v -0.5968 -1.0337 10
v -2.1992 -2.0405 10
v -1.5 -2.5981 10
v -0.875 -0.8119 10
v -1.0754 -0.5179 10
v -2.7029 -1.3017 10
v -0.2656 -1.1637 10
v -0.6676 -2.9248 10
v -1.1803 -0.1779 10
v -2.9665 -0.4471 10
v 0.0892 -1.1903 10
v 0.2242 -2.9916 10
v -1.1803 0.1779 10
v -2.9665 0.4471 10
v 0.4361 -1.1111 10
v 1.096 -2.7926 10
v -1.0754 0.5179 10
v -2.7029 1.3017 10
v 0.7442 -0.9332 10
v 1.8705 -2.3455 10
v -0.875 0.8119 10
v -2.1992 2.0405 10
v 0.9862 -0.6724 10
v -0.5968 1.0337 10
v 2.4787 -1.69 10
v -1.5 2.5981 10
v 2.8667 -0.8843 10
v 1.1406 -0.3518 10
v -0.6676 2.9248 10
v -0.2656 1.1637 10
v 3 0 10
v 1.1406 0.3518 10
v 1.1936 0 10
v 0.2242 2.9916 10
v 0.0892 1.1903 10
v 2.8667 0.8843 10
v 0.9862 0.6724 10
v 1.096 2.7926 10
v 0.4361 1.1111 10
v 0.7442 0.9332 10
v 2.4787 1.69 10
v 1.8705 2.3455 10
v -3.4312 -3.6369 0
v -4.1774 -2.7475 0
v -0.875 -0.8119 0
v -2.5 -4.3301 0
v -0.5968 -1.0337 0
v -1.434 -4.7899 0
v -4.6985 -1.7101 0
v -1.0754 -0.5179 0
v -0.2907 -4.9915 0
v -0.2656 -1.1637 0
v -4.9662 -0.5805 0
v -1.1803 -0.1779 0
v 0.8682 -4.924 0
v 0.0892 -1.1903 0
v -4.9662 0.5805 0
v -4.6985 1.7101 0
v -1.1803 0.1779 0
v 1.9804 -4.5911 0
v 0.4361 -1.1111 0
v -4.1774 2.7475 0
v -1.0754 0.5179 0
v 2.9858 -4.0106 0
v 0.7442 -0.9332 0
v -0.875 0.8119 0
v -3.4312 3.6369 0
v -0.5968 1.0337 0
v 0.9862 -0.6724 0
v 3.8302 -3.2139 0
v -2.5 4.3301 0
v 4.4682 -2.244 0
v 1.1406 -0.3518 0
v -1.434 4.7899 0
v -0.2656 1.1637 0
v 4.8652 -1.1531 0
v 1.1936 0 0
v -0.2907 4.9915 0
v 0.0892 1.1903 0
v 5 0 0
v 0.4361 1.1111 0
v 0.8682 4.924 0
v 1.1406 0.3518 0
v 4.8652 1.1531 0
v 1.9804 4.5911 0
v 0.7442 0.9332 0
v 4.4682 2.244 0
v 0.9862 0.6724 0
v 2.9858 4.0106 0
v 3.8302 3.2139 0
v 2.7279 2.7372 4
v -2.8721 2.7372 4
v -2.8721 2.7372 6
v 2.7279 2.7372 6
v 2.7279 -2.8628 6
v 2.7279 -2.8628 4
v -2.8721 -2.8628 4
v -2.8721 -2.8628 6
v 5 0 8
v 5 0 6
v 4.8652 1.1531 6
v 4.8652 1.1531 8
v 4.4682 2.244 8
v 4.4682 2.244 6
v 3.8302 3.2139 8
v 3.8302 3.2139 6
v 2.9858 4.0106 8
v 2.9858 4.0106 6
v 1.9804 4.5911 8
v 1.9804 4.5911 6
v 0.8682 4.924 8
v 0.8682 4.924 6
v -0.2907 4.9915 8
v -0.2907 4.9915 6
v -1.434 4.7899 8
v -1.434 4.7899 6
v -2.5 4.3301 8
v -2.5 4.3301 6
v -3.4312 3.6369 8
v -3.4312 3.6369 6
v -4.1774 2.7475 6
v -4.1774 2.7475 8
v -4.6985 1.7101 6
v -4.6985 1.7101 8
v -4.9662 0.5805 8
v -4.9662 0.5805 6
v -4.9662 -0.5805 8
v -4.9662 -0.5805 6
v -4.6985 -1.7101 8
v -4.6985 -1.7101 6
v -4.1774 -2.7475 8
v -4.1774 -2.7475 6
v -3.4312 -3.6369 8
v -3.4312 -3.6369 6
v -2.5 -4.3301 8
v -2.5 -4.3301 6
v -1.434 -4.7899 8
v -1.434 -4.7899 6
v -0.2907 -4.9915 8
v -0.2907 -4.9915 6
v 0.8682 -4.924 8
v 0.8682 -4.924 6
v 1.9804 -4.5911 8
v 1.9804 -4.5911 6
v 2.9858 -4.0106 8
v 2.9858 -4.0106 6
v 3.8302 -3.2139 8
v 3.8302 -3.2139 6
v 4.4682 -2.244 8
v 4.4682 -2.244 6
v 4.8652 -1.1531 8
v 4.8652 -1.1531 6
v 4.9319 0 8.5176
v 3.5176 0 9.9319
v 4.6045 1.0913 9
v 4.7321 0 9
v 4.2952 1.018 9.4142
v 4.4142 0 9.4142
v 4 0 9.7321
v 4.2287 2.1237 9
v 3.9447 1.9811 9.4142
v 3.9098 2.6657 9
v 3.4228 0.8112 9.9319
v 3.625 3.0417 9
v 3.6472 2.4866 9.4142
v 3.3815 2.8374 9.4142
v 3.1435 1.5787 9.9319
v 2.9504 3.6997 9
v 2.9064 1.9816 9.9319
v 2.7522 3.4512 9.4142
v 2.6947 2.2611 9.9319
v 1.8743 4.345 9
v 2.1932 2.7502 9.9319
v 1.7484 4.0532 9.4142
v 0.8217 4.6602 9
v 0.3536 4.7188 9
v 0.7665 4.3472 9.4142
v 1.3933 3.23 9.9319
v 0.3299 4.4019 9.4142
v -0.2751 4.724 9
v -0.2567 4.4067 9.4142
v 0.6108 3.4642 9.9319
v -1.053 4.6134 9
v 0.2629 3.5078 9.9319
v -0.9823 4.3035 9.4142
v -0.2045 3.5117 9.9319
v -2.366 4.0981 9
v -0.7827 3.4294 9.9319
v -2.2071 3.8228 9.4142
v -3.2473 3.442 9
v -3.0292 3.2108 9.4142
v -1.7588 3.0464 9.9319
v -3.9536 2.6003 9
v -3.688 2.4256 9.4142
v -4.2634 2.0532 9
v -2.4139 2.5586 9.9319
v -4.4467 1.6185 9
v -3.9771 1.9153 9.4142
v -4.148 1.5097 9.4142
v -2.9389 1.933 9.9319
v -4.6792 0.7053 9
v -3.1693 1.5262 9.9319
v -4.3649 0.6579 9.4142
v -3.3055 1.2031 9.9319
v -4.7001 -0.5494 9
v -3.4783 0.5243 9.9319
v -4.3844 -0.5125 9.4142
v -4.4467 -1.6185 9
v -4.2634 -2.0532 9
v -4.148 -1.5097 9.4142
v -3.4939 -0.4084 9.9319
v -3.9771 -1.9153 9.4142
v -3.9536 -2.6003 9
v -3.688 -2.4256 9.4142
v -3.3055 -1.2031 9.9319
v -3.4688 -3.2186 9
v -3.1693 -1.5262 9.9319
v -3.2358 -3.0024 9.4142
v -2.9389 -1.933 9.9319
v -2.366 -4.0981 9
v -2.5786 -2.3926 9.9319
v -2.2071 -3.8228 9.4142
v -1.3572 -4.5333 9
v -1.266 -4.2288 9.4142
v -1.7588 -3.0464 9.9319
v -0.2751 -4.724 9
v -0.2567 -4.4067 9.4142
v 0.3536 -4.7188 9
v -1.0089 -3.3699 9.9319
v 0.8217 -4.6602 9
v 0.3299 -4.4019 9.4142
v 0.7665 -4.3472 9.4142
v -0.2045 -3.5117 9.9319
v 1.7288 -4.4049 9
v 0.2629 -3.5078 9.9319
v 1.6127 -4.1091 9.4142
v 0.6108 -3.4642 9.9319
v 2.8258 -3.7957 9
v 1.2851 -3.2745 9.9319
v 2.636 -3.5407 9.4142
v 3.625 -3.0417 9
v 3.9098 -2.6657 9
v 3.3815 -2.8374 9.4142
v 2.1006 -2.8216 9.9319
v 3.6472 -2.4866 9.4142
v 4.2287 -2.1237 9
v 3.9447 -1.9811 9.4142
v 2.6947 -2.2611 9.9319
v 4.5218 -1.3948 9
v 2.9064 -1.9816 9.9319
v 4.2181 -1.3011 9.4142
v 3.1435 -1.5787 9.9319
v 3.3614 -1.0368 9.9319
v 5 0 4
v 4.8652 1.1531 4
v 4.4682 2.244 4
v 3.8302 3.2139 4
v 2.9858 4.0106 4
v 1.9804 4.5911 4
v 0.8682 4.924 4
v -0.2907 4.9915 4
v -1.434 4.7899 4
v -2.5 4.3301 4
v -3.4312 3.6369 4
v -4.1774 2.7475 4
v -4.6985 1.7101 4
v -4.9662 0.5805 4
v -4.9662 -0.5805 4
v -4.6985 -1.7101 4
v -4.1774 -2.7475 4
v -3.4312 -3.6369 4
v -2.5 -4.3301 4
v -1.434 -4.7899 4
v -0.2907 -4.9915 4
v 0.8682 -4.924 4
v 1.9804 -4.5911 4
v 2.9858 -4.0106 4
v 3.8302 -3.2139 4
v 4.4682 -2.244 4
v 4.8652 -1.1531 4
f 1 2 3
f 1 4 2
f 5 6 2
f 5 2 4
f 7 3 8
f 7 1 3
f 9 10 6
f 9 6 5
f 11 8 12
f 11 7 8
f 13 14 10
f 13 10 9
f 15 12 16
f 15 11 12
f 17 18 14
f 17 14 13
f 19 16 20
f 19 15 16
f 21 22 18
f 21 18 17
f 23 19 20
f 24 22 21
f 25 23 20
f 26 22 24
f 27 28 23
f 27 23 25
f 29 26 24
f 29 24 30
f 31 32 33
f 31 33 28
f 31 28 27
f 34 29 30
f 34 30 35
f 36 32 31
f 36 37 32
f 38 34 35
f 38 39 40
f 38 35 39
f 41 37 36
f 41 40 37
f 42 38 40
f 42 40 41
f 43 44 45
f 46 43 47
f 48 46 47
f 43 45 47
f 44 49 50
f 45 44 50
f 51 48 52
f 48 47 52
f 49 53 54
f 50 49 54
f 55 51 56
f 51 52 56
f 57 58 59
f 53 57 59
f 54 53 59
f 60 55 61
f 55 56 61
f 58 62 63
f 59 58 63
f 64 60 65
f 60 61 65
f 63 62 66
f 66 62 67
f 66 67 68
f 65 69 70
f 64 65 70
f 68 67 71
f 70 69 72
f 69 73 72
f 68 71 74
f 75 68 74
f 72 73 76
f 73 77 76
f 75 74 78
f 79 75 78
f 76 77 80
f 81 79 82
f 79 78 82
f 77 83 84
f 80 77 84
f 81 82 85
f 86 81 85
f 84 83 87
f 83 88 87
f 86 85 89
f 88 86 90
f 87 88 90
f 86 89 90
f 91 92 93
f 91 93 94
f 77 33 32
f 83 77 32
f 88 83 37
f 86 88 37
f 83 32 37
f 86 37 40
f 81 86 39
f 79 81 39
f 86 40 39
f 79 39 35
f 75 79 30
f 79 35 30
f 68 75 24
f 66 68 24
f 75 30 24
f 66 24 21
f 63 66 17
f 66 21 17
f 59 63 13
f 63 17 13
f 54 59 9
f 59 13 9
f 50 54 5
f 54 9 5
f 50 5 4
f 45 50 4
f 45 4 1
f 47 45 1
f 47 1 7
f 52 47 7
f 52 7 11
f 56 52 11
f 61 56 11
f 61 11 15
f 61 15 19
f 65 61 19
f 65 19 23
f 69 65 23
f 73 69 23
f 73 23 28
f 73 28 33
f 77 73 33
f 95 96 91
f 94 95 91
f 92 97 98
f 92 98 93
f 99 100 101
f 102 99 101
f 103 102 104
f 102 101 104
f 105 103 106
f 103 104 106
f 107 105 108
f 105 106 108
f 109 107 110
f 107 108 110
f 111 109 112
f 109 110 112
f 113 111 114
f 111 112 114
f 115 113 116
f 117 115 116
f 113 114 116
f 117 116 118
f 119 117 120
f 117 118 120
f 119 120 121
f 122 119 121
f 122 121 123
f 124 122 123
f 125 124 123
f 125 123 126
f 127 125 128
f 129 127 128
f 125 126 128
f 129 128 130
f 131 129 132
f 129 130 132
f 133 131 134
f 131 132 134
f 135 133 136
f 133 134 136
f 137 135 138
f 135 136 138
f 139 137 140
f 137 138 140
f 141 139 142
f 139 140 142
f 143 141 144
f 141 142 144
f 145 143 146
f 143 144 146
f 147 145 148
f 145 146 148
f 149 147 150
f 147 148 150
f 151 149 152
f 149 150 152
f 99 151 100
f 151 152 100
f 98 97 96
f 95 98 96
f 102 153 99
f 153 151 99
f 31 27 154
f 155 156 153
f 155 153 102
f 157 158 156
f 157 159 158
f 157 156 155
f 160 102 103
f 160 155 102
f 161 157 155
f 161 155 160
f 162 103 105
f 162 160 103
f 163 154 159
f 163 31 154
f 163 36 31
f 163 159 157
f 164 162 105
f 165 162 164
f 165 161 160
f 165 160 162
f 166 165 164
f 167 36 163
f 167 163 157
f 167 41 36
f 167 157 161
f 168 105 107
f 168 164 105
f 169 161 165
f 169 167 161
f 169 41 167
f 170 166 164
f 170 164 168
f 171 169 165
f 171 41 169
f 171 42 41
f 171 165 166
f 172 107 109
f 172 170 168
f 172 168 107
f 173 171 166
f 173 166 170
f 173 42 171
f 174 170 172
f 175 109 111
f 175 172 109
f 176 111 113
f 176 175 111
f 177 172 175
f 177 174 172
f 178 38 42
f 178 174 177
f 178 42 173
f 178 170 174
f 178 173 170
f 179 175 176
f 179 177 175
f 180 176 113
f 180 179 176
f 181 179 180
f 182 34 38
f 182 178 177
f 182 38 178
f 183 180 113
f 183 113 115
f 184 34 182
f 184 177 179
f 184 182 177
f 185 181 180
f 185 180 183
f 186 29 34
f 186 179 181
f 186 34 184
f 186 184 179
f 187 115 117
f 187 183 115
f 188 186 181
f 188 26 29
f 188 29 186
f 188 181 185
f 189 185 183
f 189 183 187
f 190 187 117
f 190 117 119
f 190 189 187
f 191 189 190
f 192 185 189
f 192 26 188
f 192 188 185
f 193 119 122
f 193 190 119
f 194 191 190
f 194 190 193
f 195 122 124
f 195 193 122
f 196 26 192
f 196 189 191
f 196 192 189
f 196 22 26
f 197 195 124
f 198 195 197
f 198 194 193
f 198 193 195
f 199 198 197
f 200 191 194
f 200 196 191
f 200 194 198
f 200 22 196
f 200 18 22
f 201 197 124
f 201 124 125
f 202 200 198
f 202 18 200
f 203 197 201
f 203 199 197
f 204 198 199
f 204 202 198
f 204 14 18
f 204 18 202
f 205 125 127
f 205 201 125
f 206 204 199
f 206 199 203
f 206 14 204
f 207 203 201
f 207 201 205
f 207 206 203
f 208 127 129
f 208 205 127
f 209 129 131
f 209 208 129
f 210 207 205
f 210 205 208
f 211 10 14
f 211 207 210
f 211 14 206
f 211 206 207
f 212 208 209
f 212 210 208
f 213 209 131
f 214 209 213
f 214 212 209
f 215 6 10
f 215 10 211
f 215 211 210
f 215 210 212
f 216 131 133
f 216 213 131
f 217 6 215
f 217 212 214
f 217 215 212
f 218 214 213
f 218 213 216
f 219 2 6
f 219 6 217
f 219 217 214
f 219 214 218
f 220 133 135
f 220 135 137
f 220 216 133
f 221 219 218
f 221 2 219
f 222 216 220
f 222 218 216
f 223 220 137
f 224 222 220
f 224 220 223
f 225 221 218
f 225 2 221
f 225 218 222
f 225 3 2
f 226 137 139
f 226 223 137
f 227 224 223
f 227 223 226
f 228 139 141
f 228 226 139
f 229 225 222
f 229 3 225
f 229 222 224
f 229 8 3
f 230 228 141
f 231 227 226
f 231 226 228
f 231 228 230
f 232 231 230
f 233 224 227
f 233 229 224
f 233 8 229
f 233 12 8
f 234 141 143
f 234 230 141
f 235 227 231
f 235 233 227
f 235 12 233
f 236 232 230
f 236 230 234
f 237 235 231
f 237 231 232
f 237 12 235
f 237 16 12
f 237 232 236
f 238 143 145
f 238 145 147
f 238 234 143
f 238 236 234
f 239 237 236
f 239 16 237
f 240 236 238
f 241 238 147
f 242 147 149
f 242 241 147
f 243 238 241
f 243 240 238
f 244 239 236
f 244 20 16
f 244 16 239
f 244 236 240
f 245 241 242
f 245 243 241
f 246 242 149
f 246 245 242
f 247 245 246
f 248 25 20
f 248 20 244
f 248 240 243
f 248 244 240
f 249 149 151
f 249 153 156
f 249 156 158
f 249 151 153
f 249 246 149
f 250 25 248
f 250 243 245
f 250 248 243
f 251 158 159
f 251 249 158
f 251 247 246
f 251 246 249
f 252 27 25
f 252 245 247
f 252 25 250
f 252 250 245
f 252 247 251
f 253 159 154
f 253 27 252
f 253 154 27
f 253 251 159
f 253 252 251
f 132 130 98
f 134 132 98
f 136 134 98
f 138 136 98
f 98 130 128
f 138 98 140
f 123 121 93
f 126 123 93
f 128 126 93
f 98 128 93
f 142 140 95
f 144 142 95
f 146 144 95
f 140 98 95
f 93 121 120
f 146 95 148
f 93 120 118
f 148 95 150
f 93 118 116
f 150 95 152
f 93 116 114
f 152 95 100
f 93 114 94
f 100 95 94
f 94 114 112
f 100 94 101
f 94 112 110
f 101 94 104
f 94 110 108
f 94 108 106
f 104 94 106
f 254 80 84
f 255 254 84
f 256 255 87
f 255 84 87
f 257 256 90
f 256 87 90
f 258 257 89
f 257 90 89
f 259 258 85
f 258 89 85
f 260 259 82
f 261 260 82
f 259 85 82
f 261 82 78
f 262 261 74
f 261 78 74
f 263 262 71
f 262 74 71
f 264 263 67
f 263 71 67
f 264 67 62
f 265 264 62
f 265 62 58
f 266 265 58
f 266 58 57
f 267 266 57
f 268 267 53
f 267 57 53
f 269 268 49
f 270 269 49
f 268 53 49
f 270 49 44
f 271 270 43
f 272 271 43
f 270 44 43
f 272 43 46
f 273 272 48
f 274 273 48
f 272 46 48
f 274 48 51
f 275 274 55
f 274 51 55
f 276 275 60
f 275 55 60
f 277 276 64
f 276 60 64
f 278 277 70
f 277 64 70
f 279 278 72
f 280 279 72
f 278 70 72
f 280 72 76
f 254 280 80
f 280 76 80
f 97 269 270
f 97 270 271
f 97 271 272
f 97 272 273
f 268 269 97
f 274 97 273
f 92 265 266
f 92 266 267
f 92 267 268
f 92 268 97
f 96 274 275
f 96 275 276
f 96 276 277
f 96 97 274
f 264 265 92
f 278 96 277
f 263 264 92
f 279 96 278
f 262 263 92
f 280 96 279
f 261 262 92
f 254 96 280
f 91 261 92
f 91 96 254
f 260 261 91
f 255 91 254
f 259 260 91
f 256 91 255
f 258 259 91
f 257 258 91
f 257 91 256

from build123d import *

# Parameters (mm, degrees)
F0_R     = 5
F1_DEPTH = 4
F2_W     = 5.6
F2_H     = 5.6
F3_DEPTH = 2
F4_R     = 5
F5_DEPTH = 4
F6_R     = 1.1936420452
F7_DEPTH = 10.001
F8_R     = 2


with BuildPart() as f1:
    # F0 (on Top) → F1 (new body)
    with BuildSketch(Plane.XY):
        Circle(F0_R)
    extrude(amount=F1_DEPTH)

    # F2 (on face) → F3 (join)
    with BuildSketch(Plane.XY.offset(4)):
        with Locations((-0.0721134877, -0.062788504)):
            Rectangle(F2_W, F2_H)
    extrude(amount=F3_DEPTH)

    # F4 (on face) → F5 (join)
    with BuildSketch(Plane.XY.offset(6)):
        Circle(F4_R)
    extrude(amount=F5_DEPTH)

    # F6 (on face) → F7 (cut, through all)
    with BuildSketch(Plane.XY.offset(10)):
        Circle(F6_R)
    extrude(amount=-F7_DEPTH, mode=Mode.SUBTRACT)

    # F8
    f8_edges = [f1.edges().sort_by_distance(p)[0] for p in [
        (-5, 0, 10),
    ]]
    fillet(f8_edges, radius=F8_R)


solid = f1.part
